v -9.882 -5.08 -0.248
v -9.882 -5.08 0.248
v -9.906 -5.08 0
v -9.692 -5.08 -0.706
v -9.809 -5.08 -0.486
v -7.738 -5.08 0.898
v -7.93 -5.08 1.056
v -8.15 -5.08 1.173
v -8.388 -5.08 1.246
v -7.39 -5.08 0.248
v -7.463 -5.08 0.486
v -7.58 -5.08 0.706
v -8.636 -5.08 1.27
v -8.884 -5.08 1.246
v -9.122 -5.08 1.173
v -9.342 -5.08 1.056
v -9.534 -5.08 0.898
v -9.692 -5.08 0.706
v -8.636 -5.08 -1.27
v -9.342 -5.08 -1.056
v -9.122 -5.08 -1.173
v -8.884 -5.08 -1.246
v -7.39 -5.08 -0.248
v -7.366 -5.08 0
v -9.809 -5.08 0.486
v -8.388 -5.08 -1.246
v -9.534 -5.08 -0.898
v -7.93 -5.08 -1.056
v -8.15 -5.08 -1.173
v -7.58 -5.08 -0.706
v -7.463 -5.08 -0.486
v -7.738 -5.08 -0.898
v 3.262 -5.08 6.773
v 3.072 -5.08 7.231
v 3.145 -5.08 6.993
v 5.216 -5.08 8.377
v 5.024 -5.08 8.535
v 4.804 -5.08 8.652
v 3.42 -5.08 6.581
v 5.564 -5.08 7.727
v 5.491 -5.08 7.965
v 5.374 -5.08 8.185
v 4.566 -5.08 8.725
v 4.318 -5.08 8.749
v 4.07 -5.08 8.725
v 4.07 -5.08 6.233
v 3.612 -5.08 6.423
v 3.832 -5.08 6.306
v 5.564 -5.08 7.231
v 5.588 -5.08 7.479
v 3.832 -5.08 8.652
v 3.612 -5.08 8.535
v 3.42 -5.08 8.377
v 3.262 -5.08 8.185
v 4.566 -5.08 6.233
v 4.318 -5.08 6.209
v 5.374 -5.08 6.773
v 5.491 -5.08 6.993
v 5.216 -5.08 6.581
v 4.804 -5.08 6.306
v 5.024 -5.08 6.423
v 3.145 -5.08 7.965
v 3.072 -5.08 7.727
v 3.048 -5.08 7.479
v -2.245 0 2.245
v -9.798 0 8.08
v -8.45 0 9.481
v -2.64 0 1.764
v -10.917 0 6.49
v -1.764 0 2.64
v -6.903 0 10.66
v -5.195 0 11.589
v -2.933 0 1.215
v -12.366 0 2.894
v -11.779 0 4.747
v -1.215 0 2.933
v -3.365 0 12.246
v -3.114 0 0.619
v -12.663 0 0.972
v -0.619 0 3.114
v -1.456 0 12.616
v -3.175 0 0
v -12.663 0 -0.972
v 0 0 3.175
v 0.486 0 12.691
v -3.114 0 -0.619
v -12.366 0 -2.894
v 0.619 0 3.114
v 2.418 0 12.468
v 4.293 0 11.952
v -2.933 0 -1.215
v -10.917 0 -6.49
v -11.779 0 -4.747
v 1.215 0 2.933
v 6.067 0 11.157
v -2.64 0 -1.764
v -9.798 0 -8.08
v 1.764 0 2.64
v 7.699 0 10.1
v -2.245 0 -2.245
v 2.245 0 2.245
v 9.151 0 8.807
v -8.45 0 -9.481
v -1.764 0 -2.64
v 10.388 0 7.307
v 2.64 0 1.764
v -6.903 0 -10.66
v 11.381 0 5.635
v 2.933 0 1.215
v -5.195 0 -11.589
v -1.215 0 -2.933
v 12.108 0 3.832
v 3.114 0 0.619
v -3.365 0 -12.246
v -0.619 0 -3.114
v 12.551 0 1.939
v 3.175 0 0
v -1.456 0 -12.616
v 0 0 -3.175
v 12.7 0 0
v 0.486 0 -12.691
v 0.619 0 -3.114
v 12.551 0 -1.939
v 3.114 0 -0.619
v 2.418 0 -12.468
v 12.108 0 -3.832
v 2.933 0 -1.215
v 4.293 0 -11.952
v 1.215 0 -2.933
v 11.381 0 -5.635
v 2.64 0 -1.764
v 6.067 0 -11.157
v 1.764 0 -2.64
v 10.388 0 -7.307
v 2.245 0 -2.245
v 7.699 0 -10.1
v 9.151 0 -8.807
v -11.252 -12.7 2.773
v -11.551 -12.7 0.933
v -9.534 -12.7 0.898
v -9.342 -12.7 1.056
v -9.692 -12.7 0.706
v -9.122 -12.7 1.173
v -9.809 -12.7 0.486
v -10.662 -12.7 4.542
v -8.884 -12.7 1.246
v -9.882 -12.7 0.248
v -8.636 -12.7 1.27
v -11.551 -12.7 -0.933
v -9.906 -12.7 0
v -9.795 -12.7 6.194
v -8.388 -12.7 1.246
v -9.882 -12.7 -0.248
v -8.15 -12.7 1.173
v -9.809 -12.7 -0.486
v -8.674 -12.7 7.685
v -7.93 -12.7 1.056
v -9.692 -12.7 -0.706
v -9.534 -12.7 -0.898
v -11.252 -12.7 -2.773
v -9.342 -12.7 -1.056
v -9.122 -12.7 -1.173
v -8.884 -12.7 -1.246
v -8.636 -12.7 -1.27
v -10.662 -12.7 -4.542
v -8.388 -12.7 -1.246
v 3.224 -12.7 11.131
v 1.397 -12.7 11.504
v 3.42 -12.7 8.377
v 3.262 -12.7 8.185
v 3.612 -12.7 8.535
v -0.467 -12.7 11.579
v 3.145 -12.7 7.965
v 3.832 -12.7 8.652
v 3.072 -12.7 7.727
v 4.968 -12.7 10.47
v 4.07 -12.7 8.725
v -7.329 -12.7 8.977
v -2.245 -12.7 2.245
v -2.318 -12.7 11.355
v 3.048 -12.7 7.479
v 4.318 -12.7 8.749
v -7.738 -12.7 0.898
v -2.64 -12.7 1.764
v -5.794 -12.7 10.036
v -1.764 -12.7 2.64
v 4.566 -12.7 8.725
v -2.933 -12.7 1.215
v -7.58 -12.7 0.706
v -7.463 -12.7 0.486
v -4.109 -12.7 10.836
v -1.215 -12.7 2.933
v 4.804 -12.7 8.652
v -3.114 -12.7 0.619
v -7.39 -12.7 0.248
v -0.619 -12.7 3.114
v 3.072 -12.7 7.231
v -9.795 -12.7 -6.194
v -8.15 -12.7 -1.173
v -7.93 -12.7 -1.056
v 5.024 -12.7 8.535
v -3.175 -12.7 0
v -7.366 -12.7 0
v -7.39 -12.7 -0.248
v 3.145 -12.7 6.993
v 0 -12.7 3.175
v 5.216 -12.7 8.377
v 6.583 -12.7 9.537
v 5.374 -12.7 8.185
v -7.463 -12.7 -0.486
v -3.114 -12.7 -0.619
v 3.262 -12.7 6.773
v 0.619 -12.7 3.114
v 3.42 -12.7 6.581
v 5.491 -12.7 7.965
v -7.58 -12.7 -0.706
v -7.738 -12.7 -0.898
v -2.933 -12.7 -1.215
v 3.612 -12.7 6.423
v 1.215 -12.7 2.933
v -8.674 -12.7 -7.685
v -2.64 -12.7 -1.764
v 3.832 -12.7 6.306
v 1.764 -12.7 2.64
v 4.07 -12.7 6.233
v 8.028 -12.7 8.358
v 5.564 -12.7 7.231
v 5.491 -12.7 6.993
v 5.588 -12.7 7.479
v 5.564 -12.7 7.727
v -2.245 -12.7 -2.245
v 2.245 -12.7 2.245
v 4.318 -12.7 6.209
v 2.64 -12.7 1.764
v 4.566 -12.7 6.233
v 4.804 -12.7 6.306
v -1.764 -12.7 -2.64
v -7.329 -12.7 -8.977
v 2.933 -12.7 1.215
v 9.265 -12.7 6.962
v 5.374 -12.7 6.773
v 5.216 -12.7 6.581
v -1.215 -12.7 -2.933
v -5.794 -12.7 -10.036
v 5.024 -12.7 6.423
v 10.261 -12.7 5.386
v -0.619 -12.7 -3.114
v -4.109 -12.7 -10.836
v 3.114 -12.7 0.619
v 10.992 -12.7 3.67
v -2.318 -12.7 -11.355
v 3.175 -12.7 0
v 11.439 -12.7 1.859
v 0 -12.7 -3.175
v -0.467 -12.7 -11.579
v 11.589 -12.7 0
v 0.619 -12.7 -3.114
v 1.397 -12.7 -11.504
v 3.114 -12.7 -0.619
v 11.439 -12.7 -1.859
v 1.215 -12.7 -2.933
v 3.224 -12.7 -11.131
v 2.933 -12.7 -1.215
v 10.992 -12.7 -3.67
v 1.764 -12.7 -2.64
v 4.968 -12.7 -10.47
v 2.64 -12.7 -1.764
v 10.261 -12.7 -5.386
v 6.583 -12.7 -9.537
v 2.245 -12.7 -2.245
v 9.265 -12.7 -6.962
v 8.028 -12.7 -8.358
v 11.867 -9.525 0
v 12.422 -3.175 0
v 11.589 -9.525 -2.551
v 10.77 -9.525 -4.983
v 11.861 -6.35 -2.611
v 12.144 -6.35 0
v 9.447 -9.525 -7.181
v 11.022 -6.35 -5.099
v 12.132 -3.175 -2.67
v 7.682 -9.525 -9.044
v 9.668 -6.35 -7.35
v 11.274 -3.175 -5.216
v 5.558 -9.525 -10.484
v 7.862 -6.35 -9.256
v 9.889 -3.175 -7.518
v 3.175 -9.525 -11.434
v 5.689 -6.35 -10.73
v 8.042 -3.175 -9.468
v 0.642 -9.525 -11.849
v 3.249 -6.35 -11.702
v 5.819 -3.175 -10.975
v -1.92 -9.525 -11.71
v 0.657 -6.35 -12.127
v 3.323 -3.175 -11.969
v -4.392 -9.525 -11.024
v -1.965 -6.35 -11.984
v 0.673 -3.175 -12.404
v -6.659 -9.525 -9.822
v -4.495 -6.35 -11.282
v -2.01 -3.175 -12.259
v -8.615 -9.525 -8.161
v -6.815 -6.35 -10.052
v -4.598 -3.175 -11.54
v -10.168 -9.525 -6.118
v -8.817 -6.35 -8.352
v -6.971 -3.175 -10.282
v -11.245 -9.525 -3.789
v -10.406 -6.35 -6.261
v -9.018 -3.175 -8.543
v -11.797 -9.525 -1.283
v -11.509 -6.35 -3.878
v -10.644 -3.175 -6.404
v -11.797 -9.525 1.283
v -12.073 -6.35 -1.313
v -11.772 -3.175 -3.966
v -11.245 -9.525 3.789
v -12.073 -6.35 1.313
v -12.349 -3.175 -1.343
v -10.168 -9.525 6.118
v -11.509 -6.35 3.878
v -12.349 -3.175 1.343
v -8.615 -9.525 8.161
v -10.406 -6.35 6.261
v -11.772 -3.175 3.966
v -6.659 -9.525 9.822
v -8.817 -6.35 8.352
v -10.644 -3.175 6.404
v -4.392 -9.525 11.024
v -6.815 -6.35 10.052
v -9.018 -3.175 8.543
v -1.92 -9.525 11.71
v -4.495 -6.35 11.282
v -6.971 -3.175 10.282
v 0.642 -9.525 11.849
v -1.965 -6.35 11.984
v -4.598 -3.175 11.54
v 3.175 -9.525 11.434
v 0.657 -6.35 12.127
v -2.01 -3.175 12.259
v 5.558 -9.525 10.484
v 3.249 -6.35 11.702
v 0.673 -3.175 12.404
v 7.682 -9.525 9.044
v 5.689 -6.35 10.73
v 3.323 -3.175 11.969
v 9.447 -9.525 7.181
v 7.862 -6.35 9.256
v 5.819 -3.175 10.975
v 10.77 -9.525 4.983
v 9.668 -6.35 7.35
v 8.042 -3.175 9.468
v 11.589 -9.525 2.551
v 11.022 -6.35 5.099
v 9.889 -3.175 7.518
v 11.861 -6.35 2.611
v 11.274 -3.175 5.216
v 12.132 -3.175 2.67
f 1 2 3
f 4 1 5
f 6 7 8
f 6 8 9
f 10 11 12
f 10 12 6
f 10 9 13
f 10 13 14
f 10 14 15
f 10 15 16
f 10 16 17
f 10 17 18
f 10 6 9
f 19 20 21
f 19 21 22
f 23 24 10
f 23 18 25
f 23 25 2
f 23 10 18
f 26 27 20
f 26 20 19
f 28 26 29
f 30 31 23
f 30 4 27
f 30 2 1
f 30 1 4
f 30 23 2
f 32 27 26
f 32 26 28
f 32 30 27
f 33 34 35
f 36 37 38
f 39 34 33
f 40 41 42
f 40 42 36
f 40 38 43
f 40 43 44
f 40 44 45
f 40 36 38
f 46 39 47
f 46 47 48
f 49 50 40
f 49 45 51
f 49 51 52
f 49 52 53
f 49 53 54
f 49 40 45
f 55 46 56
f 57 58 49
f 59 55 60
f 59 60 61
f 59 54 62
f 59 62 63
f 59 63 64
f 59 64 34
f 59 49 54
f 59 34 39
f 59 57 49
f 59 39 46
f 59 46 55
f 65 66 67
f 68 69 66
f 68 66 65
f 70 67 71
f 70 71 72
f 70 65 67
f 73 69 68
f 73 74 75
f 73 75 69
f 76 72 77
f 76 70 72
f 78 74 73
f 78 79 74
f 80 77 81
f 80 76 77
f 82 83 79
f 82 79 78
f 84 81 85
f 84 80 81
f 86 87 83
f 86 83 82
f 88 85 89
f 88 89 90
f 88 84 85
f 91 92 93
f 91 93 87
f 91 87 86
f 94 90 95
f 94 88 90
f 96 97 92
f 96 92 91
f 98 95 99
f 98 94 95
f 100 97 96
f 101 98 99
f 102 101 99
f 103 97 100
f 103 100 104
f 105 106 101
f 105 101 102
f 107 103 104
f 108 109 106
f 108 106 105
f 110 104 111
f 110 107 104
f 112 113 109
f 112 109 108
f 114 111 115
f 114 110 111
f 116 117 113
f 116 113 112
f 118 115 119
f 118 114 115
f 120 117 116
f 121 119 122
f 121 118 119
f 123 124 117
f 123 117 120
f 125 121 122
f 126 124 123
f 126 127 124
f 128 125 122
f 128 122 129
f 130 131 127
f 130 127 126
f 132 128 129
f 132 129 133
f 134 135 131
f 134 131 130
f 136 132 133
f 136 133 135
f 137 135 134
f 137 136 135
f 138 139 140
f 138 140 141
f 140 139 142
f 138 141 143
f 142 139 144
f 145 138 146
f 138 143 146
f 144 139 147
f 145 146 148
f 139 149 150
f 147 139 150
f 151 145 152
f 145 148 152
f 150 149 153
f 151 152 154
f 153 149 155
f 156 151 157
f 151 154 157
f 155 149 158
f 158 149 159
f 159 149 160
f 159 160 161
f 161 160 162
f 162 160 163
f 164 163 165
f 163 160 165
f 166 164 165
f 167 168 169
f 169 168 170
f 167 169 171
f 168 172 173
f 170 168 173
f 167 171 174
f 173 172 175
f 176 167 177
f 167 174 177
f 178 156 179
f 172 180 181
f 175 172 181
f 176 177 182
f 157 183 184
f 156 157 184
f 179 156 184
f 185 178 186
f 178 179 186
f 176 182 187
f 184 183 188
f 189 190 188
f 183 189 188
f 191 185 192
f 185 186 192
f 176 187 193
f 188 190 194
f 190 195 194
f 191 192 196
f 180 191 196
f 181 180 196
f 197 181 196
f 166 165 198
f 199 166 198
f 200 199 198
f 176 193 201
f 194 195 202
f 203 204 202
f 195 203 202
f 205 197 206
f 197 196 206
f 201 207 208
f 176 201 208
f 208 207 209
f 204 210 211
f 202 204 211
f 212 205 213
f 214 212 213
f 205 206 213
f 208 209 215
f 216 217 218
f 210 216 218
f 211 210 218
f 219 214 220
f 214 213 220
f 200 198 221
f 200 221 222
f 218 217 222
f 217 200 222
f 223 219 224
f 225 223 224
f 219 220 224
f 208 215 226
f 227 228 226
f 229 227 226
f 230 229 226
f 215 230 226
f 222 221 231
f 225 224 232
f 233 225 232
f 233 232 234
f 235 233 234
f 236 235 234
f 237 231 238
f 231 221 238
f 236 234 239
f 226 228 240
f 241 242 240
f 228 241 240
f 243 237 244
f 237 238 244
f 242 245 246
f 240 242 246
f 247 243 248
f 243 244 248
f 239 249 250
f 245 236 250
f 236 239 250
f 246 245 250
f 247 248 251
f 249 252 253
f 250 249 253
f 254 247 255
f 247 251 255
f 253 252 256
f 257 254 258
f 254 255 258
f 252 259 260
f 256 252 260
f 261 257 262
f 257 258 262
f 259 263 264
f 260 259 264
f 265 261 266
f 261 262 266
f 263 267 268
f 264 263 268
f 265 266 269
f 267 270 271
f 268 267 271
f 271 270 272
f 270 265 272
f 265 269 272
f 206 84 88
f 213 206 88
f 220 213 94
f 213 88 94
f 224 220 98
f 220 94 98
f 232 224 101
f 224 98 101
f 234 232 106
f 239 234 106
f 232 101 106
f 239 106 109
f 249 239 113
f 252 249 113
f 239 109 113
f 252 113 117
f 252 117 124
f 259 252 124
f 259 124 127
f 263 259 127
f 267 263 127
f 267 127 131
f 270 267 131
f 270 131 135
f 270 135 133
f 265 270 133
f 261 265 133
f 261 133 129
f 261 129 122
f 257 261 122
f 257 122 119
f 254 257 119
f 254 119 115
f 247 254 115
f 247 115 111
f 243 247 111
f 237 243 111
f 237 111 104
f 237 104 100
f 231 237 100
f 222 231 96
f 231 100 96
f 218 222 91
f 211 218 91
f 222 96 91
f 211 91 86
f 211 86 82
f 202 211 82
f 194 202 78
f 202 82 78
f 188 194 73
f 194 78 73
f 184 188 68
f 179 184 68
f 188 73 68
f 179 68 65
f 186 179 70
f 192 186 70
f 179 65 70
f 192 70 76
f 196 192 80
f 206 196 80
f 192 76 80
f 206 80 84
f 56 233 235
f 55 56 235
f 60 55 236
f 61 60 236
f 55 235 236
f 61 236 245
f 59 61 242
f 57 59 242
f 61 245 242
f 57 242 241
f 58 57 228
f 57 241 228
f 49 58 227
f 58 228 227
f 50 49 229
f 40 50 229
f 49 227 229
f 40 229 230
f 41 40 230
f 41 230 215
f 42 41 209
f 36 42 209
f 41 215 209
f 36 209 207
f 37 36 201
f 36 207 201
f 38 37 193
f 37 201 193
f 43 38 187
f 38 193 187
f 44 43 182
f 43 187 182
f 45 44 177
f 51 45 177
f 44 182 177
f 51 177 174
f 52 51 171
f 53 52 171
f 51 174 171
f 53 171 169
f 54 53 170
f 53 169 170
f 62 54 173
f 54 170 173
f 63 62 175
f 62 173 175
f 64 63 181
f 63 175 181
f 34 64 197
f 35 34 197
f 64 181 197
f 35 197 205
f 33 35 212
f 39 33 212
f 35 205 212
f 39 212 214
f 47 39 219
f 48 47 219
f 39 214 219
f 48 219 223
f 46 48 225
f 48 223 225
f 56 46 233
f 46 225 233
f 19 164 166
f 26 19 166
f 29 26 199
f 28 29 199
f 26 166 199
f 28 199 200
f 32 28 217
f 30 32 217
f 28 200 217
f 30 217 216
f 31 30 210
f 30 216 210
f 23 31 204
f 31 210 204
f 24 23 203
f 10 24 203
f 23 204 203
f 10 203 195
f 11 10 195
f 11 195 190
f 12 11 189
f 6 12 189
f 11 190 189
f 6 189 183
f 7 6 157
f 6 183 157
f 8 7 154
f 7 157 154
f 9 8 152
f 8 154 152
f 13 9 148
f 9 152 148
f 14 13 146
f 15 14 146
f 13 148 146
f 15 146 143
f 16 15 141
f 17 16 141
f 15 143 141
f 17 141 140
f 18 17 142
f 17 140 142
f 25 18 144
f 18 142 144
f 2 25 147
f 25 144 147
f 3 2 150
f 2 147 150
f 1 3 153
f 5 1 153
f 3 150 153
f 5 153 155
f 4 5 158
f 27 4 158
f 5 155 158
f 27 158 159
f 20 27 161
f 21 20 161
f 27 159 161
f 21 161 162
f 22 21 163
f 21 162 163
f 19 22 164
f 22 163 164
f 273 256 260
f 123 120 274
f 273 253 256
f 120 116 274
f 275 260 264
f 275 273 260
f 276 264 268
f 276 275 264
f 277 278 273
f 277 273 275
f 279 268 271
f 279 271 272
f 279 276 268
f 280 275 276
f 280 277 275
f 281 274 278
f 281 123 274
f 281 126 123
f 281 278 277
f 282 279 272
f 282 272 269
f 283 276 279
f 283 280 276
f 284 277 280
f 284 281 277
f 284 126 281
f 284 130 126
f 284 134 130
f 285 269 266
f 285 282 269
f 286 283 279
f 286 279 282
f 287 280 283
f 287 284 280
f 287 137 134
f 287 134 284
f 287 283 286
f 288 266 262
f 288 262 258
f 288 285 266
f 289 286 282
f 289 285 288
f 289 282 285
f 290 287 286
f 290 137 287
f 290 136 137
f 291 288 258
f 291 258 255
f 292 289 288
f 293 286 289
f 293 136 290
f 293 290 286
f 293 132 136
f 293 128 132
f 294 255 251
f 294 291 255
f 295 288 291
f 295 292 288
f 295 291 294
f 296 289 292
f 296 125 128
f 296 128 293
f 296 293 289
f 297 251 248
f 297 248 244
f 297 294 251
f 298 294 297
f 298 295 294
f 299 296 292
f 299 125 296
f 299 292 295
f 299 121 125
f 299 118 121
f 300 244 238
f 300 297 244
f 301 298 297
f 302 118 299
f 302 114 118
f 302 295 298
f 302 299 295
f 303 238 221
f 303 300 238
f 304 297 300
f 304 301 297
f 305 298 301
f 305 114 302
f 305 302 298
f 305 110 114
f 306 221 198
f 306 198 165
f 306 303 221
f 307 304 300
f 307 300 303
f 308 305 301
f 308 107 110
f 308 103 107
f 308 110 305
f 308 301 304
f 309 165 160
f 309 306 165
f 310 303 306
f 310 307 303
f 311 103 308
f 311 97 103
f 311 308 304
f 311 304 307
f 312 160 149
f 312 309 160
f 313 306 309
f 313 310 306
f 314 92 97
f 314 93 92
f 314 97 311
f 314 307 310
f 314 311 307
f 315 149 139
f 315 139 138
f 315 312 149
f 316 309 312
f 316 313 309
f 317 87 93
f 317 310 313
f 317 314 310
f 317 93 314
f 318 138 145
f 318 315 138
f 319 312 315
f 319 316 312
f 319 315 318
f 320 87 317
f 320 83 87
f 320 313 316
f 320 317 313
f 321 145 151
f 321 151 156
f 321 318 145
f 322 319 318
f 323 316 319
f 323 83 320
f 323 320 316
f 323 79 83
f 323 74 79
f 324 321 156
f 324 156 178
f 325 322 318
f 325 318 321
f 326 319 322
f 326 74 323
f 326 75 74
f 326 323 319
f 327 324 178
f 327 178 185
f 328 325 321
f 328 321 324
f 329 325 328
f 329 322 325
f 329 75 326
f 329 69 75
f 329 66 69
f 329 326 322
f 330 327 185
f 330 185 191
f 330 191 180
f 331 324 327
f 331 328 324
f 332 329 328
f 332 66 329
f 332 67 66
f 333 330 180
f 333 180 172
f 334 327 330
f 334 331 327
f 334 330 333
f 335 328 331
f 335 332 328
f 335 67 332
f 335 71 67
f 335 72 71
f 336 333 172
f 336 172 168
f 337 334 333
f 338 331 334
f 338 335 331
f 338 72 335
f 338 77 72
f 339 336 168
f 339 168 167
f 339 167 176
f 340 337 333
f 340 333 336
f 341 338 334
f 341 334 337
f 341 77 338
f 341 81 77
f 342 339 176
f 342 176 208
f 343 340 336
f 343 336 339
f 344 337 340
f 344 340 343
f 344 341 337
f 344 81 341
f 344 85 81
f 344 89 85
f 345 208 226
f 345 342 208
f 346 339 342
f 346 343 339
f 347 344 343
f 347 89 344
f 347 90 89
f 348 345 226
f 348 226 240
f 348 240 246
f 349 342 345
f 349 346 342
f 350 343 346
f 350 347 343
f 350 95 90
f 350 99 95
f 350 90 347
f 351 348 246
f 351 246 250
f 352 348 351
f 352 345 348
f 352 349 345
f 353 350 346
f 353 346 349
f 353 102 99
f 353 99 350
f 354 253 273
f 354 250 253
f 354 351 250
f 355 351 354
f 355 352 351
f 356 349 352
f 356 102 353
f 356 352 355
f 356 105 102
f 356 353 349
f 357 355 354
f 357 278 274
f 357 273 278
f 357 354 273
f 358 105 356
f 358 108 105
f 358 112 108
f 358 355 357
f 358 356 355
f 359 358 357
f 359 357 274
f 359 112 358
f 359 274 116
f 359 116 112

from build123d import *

# Parameters (mm, degrees)
SKETCH1_R           = 12.7
BOSS_EXTRUDE1_DEPTH = 12.7
BOSS_EXTRUDE1_DRAFT = -5
SKETCH2_R           = 3.175
CUT_EXTRUDE1_DEPTH  = 22.997045256
SKETCH7_R           = 1.27
CUT_EXTRUDE2_DEPTH  = 7.62


with BuildPart() as part:
    # Sketch1 → Boss-Extrude1 (with draft: the straight prism first)
    with BuildSketch(Plane(origin=(0, 0, 0), x_dir=(1, 0, 0), z_dir=(0, 1, 0))):
        Circle(SKETCH1_R)
    extrude(amount=-BOSS_EXTRUDE1_DEPTH)
    # Boss-Extrude1: the draft: its side faces are tilted about the plane it starts from
    boss_extrude1_sides = [part.faces().sort_by_distance(p)[0] for p in [
        (-12.7, -6.35, 0),
    ]]
    draft(boss_extrude1_sides, Plane(origin=(0, 0, 0), x_dir=(1, 0, 0), z_dir=(0, 1, 0)), BOSS_EXTRUDE1_DRAFT)

    # Sketch2 → Cut-Extrude1 (cut, through all)
    with BuildSketch(Plane(origin=(0, 0, 0), x_dir=(1, 0, 0), z_dir=(0, 1, 0))):
        with Locations(Location((0, 0, 0), (0, 0, 270))):
            Circle(SKETCH2_R)
    extrude(amount=-CUT_EXTRUDE1_DEPTH, mode=Mode.SUBTRACT)

    # Sketch7 → Cut-Extrude2 (cut)
    with BuildSketch(Plane.XZ.offset(12.7)):
        with Locations(Location((-8.636, 0, 0), (0, 0, 270))):
            Circle(SKETCH7_R)
        with Locations(Location((4.318, 7.478995387, 0), (0, 0, 270))):
            Circle(SKETCH7_R)
    extrude(amount=-CUT_EXTRUDE2_DEPTH, mode=Mode.SUBTRACT)


solid = part.part
